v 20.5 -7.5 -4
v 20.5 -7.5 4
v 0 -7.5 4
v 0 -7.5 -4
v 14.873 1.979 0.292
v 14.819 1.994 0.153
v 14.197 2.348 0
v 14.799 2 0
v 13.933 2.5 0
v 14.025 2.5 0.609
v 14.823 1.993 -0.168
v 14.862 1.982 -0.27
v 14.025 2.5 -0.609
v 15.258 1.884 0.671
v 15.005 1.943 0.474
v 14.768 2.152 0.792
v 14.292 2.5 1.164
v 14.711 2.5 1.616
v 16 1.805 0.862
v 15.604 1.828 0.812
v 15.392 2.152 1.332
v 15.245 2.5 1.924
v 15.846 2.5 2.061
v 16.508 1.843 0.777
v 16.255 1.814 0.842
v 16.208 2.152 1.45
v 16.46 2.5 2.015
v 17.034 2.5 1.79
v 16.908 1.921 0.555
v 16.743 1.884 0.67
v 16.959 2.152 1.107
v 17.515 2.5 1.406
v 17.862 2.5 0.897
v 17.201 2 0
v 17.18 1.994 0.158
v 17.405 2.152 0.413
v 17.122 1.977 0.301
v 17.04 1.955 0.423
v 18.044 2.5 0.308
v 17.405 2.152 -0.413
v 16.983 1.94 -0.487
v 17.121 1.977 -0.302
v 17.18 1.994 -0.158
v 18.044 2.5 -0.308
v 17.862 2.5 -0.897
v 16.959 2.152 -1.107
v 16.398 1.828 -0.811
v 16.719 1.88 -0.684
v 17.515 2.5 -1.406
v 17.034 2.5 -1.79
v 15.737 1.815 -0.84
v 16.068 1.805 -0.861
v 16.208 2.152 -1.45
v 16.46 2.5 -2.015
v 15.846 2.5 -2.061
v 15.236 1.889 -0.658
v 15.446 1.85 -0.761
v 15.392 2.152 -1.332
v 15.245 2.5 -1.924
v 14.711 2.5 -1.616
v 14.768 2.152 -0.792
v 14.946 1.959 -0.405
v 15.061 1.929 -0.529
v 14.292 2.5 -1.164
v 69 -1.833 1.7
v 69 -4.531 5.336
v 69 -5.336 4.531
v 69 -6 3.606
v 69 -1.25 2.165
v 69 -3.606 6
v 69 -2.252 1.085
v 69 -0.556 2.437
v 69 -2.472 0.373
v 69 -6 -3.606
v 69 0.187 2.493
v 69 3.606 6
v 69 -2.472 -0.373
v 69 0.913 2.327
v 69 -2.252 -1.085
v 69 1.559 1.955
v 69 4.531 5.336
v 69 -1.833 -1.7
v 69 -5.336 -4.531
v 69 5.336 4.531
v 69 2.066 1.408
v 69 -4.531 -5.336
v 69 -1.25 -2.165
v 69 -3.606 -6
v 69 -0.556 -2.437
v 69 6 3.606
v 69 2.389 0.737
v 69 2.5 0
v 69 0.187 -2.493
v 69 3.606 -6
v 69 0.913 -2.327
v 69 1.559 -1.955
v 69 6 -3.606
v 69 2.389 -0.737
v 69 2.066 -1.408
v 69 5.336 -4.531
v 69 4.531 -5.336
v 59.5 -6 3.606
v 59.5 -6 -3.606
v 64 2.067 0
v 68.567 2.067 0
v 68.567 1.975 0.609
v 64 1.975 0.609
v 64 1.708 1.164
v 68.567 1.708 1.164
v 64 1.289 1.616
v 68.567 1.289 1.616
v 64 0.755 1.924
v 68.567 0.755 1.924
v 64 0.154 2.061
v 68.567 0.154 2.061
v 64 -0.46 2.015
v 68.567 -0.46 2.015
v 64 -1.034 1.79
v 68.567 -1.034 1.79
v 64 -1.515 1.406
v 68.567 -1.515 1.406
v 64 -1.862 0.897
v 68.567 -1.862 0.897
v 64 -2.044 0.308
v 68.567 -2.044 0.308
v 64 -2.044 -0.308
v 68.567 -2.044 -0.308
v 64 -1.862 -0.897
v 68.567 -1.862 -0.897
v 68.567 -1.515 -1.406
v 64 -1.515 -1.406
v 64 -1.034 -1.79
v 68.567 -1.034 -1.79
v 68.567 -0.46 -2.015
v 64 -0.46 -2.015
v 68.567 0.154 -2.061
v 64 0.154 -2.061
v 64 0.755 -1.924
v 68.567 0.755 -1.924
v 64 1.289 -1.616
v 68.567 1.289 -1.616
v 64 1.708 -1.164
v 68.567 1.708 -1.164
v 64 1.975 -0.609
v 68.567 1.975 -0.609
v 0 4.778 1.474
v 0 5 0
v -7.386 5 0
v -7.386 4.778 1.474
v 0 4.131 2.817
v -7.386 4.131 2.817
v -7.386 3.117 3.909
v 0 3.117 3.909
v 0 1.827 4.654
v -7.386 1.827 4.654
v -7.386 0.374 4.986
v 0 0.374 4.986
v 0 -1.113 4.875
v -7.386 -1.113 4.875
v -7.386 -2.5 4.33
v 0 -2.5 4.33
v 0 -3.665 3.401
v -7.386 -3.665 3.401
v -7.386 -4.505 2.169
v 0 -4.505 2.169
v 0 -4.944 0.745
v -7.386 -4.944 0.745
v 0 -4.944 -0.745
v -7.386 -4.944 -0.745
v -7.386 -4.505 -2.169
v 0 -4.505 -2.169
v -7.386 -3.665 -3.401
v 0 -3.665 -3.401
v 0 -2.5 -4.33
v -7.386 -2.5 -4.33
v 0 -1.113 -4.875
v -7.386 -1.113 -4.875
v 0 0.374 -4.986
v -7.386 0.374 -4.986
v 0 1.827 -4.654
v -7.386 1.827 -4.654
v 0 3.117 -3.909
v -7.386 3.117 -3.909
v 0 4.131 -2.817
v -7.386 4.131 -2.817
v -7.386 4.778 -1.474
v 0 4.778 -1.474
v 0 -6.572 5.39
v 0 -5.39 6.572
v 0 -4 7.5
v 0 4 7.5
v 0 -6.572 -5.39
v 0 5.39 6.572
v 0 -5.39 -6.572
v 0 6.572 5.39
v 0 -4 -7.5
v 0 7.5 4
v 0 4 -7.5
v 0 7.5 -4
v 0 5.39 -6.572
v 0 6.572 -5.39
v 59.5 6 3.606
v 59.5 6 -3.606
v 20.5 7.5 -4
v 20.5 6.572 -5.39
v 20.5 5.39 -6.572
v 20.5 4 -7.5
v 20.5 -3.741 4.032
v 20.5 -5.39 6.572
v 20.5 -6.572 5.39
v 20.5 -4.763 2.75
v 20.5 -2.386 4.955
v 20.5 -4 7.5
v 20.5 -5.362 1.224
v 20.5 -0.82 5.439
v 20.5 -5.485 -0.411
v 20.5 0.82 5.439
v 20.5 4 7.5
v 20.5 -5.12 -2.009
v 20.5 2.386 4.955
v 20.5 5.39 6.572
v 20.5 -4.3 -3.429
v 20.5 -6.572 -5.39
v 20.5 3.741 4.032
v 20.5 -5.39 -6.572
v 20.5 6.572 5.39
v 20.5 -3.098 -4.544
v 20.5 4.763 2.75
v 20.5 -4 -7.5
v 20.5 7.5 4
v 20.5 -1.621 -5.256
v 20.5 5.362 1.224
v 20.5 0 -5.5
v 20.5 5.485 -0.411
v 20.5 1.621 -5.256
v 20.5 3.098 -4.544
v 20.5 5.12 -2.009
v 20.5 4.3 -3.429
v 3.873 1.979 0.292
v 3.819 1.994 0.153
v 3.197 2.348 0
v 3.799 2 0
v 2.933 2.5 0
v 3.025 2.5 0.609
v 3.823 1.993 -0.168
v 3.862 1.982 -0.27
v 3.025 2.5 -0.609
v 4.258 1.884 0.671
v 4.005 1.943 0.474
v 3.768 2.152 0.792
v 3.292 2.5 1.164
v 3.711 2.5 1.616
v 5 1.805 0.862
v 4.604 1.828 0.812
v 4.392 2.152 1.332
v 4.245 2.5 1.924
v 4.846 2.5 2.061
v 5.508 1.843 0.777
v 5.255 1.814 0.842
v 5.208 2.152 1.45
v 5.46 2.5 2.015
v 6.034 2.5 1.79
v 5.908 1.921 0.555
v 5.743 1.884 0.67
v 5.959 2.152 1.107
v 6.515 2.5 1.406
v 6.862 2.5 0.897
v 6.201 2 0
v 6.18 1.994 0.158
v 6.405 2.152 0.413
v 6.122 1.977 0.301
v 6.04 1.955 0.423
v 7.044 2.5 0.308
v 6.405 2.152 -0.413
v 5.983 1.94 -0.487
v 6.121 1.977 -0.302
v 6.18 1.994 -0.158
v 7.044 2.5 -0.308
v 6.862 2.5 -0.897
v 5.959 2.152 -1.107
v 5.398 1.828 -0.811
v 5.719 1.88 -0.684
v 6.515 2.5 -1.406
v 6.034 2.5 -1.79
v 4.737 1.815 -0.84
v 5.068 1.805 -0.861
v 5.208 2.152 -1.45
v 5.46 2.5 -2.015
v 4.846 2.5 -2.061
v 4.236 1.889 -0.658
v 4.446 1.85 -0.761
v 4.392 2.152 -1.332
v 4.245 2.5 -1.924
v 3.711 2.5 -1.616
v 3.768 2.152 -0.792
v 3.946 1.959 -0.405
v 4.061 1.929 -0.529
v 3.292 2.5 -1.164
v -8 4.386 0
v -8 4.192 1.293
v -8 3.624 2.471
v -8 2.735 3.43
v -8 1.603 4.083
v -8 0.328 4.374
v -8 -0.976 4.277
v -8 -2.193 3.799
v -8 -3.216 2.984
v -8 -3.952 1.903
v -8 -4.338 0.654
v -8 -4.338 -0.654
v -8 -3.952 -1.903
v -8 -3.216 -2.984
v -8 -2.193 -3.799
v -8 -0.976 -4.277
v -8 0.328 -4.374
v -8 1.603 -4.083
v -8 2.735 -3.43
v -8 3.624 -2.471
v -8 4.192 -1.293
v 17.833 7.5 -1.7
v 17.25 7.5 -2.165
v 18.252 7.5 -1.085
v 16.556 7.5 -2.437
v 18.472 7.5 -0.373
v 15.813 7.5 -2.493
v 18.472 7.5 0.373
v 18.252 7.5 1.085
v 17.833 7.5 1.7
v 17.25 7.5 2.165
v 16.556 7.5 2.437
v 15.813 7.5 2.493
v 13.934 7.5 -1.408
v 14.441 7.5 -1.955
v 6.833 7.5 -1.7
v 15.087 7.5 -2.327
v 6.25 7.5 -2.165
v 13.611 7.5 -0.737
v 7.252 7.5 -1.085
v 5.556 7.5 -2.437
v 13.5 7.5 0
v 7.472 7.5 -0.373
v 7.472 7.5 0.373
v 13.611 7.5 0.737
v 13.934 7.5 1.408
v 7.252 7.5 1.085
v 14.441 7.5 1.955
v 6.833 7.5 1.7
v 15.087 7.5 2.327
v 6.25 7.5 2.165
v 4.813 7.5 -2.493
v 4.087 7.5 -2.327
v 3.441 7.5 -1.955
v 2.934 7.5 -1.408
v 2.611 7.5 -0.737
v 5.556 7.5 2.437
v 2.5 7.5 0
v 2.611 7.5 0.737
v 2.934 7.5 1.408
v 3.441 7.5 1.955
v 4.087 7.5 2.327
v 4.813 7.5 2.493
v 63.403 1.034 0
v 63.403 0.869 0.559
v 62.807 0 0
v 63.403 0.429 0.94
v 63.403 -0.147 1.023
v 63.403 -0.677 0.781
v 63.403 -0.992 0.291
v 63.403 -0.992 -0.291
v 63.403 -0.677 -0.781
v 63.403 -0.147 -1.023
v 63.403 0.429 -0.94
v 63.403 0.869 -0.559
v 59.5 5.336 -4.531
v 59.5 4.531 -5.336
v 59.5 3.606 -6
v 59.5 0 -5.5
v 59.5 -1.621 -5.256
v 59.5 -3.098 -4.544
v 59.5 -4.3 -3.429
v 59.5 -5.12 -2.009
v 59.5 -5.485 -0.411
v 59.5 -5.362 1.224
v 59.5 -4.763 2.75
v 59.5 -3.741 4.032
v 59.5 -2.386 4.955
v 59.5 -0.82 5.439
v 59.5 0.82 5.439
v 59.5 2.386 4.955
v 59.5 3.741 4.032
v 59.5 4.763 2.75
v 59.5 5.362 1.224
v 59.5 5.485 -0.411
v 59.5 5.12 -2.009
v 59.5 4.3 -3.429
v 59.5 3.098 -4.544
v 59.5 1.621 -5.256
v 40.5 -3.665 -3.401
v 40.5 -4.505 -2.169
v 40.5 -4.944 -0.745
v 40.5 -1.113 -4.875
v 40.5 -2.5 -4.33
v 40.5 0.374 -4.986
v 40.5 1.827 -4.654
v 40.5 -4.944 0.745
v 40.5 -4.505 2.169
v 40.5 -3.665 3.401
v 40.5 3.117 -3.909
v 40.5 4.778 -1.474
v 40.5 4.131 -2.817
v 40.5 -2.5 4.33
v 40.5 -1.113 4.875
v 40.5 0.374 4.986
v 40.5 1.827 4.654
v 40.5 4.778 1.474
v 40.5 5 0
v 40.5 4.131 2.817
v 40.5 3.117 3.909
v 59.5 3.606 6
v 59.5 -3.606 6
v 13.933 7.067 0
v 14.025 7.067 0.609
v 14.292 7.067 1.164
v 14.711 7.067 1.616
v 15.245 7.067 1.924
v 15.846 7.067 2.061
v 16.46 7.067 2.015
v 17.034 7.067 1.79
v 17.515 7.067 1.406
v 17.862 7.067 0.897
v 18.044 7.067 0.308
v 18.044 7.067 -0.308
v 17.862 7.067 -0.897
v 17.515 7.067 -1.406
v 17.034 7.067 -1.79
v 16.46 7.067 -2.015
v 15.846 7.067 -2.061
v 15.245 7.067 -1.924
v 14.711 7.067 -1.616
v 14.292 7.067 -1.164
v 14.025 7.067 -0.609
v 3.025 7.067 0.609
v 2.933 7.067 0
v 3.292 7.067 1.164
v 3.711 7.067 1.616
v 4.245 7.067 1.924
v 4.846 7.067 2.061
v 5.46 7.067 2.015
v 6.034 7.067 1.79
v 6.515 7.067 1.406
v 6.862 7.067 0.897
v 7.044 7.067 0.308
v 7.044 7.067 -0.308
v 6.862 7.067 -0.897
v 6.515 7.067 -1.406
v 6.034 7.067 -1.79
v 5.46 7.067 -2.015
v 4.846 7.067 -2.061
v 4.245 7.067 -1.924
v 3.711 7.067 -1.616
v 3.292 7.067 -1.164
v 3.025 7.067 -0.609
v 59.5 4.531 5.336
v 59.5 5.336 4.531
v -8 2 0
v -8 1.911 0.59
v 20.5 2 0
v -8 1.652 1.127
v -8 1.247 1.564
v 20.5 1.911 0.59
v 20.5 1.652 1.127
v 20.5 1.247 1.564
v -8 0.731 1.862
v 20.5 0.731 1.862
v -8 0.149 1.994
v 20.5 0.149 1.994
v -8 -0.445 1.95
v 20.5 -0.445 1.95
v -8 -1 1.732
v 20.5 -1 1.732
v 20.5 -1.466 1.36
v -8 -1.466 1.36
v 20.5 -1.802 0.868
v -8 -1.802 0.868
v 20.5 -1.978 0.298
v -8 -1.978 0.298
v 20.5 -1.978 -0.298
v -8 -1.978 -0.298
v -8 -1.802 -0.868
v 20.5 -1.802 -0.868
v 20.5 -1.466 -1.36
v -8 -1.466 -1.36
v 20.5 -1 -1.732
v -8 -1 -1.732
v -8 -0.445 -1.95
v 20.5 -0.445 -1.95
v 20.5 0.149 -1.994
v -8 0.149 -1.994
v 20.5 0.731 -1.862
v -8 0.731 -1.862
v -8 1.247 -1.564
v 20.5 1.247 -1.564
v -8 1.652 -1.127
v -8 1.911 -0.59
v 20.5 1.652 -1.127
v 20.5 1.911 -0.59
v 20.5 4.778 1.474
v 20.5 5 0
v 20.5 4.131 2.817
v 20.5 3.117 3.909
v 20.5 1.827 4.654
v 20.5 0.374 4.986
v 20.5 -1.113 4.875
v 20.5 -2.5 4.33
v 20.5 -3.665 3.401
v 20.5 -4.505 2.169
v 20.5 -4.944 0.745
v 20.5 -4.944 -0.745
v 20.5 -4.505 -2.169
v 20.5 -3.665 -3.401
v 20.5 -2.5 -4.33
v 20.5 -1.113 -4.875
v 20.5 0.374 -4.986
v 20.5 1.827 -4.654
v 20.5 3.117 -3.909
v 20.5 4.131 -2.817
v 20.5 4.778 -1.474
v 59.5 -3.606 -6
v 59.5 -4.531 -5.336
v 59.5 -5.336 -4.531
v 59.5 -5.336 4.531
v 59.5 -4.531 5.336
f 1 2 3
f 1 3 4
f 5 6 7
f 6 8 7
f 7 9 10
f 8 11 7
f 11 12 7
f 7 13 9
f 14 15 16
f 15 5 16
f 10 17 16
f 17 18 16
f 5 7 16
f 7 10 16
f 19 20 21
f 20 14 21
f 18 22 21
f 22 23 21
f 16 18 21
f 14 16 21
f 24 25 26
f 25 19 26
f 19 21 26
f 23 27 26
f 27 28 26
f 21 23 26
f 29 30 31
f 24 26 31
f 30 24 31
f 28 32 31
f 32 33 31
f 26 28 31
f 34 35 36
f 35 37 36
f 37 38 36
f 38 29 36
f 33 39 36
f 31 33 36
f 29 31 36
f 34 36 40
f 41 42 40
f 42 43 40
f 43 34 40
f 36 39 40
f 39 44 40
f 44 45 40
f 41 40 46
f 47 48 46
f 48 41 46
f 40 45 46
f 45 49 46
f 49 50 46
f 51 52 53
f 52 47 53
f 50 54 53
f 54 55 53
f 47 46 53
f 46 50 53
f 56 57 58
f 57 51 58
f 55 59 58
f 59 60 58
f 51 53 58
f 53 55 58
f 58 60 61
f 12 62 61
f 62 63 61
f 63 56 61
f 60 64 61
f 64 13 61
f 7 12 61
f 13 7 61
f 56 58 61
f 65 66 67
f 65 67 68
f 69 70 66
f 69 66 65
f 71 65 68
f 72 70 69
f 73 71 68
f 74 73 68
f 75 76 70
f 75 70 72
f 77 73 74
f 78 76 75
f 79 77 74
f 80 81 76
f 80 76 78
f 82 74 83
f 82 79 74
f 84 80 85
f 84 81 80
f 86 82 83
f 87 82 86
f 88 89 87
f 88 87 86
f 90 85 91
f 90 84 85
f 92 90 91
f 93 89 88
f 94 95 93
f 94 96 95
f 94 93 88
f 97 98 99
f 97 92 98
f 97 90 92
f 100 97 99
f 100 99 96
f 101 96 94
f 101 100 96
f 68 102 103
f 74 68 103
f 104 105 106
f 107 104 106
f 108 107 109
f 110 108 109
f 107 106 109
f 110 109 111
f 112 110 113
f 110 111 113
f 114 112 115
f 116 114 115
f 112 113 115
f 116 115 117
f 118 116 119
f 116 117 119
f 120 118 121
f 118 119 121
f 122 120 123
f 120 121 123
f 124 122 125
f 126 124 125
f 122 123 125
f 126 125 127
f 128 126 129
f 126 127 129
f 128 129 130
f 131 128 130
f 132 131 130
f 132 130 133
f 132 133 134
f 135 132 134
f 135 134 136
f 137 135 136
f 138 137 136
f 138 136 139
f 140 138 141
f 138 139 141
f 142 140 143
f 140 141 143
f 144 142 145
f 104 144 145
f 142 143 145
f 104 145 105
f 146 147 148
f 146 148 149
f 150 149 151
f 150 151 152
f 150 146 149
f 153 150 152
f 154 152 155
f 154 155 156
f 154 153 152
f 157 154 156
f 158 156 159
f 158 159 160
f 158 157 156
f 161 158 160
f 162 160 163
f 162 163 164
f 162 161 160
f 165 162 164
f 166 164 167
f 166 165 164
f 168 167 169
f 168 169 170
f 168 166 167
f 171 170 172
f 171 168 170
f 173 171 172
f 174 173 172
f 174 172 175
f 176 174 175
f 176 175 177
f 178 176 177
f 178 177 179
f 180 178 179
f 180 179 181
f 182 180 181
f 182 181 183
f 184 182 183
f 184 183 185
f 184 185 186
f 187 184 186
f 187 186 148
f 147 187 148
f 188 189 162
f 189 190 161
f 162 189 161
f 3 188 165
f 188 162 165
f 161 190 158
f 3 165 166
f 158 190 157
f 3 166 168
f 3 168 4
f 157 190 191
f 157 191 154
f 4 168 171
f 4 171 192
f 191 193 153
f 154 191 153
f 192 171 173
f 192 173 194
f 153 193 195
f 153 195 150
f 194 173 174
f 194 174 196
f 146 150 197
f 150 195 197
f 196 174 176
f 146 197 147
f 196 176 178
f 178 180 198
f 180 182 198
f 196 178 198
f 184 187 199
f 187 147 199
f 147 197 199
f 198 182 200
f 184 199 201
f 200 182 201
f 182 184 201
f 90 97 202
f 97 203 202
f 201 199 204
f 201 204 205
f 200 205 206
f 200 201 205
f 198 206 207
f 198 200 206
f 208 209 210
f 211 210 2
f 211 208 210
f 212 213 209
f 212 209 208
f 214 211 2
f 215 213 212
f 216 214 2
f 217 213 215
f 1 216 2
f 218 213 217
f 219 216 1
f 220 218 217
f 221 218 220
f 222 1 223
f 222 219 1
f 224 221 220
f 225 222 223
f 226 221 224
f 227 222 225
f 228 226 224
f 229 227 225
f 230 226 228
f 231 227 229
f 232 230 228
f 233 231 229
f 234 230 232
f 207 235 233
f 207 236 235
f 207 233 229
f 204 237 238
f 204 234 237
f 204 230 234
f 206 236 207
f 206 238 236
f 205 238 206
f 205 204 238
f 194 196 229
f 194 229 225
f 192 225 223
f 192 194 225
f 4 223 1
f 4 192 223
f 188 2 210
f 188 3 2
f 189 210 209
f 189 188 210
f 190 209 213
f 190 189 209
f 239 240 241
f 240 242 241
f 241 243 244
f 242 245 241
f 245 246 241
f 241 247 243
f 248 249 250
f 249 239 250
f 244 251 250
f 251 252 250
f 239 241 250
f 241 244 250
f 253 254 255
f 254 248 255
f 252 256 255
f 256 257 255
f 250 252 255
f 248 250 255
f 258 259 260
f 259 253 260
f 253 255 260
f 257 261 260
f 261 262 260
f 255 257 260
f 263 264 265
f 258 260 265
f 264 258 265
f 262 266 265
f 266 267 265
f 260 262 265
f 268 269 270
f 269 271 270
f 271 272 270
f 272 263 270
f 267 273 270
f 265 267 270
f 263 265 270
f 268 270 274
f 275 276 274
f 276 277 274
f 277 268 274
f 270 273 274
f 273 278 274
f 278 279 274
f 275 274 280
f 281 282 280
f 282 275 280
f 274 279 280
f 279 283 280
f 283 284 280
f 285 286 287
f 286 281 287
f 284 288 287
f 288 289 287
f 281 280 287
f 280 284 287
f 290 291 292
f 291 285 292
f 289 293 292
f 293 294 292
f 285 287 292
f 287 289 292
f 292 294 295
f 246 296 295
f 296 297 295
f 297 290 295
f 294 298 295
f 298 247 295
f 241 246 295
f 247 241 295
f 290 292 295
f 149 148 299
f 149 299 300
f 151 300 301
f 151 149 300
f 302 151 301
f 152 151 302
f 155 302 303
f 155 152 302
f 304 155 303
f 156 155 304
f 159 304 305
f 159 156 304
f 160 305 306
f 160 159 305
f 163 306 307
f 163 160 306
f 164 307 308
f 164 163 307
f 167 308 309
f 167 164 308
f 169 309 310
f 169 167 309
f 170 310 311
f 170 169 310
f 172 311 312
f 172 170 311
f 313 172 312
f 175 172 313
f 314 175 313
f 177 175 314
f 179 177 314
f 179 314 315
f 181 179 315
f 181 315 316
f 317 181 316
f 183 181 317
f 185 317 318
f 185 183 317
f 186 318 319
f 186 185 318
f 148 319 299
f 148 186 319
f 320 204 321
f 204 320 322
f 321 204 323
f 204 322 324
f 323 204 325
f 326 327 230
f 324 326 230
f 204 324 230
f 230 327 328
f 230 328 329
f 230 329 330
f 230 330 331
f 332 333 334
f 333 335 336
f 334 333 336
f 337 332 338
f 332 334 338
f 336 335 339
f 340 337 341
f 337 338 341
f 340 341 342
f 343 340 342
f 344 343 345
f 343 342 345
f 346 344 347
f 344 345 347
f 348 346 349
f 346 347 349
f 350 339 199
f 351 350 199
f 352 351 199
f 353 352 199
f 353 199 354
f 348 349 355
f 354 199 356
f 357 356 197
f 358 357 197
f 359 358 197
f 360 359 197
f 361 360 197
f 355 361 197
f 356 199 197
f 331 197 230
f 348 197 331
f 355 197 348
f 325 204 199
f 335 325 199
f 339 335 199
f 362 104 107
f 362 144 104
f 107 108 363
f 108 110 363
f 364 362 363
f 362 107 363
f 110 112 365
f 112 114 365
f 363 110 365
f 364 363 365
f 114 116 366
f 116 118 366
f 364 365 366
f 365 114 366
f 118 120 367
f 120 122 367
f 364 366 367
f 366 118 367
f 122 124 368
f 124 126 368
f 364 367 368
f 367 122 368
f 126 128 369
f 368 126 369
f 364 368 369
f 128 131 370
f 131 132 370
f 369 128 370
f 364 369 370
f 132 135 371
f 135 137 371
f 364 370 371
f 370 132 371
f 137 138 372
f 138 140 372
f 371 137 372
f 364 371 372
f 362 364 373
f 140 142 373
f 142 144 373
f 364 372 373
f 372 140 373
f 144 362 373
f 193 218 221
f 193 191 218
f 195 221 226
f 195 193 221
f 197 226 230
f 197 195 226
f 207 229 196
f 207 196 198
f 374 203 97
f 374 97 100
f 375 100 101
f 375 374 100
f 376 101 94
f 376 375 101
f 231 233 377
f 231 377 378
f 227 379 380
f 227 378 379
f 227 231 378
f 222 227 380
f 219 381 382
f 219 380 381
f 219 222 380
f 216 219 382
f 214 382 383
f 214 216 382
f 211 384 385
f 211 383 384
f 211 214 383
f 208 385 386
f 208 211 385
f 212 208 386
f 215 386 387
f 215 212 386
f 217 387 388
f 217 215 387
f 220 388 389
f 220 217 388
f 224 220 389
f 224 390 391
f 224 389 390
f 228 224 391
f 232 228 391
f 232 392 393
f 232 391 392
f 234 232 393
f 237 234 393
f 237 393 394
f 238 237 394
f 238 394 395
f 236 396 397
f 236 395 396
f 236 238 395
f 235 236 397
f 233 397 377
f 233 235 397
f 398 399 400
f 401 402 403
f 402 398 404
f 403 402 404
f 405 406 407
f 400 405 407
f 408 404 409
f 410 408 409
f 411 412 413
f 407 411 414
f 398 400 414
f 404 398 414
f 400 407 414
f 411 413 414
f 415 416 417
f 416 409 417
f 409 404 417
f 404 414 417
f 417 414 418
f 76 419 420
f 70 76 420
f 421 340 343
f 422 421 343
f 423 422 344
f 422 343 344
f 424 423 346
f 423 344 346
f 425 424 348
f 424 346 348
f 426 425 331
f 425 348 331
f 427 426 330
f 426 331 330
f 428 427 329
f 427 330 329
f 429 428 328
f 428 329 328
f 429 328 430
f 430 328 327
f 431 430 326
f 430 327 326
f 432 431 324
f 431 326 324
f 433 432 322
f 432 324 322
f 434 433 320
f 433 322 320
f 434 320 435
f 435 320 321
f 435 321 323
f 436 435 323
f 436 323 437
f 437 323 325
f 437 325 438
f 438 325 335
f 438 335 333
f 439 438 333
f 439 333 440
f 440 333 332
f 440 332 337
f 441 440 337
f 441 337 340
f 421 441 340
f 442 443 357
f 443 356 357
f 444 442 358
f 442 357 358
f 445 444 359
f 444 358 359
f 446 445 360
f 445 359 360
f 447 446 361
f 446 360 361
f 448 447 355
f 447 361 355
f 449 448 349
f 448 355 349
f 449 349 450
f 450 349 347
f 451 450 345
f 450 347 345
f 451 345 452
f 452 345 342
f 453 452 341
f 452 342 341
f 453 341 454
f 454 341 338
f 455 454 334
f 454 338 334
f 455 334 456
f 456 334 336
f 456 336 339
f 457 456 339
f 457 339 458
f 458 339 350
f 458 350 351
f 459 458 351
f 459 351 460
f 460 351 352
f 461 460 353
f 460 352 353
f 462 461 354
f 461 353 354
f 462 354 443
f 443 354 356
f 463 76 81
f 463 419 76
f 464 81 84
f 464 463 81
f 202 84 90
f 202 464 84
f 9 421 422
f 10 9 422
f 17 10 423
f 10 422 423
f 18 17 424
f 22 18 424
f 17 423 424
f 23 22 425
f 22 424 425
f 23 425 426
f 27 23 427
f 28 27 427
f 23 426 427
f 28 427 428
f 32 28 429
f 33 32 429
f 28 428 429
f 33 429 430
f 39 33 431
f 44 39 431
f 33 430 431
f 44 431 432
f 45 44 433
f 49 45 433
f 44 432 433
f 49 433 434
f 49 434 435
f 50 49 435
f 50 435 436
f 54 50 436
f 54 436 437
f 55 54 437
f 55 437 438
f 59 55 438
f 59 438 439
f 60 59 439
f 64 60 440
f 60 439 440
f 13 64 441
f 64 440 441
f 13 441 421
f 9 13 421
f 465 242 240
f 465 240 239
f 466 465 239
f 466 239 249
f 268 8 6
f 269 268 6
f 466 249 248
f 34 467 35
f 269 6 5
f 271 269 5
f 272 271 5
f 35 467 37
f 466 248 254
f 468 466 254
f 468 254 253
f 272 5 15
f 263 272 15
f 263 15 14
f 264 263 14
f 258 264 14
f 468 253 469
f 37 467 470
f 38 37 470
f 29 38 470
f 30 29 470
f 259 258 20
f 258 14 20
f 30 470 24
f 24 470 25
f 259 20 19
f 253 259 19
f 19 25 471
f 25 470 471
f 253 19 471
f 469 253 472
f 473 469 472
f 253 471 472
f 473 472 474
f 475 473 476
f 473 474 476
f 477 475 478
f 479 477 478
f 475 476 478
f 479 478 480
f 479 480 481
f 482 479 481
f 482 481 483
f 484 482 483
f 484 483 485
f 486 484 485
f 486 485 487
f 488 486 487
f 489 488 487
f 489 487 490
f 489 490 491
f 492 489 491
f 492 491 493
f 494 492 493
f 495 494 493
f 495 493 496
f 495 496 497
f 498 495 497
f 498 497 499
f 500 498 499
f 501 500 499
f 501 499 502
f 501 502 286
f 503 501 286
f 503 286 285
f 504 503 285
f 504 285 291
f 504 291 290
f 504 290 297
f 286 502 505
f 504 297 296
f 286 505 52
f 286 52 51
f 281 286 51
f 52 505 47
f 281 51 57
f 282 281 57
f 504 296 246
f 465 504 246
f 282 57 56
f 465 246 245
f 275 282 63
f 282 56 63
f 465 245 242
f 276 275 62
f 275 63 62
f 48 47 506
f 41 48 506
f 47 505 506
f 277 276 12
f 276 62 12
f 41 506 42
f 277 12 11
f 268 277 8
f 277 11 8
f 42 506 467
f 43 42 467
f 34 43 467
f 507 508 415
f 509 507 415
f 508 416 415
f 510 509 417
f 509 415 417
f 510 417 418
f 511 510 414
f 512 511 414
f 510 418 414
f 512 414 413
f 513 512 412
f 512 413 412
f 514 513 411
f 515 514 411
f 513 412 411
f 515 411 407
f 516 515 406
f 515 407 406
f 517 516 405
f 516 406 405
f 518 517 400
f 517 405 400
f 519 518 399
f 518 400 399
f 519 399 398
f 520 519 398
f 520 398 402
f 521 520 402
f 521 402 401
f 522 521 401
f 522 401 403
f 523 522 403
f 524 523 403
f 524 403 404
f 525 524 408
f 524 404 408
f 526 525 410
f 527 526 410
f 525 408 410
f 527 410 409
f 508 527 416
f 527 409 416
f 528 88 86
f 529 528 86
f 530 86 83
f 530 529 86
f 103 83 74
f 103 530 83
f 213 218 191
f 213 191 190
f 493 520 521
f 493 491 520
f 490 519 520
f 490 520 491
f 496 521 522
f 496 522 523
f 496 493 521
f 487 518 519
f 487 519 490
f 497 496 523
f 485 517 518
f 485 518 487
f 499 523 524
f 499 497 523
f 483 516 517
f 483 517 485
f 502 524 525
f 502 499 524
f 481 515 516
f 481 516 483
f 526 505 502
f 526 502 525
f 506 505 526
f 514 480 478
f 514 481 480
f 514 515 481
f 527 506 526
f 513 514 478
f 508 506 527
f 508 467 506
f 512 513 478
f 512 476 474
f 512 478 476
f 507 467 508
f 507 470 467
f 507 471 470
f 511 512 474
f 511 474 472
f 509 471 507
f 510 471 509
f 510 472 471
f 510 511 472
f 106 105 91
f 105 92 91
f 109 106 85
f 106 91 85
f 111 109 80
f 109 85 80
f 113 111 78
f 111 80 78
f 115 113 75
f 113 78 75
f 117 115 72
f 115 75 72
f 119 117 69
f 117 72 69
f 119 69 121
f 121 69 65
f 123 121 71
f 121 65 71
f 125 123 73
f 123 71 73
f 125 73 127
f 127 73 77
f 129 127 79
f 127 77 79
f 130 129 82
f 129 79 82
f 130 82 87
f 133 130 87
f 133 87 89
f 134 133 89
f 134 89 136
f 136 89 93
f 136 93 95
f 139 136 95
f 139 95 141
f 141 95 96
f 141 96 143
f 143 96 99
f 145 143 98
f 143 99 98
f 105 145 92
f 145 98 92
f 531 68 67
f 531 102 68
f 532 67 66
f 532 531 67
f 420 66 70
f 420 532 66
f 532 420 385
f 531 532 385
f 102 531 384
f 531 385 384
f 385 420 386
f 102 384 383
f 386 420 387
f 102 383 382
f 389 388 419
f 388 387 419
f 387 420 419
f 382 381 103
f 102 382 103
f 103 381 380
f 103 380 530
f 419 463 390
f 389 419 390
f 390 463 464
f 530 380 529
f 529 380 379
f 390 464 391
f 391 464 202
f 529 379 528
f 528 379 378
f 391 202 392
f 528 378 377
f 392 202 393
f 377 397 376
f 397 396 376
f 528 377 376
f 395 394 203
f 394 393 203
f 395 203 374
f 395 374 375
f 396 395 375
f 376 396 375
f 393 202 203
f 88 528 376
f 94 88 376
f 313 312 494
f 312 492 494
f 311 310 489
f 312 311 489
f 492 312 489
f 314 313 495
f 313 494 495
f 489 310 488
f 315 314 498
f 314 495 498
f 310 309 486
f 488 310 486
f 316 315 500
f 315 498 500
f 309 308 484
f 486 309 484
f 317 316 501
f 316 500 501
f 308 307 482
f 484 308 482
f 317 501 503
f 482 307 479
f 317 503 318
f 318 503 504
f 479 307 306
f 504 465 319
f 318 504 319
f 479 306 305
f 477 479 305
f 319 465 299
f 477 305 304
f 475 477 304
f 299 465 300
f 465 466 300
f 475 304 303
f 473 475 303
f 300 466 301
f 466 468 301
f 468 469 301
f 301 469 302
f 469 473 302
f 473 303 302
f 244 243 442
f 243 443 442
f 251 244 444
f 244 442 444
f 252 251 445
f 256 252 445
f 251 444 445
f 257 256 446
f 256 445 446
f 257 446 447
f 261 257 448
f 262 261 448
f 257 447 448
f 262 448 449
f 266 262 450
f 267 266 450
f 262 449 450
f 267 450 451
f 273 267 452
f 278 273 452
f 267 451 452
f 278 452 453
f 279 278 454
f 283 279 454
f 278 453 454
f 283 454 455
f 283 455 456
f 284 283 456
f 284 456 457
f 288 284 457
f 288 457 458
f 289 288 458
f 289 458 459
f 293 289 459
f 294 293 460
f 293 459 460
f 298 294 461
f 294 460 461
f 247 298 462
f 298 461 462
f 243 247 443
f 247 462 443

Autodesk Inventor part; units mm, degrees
sketch "Sketch_8" plane through (0, 0, 0) normal (0, 0, 1) x (1, 0, 0)
  line L0 (0, 0) -> (-8, 0)
  line L1 (-8, 0) -> (-8, 4.3865)
  line L2 (-8, 4.3865) -> (-7.3865, 5)
  line L3 (-7.3865, 5) -> (0, 5)
  line L4 (0, 5) -> (0, 0)
  line L5 (0, 0) -> (-8, 0)
revolve "Revolution1" add sketch "Sketch_8" angle 360 about axis through (0, 0, 0) along (1, 0, 0)
thread "Thread1" size "M10x1" class "6g" standard "ISO Metric profile" length 5.8865
sketch "Sketch_9" plane through (0, 0, 0) normal (1, 0, 0) x (0, 0, -1)
  line L0 (-7.5, 4) -> (-7.5, -4)
  arc A0 (-7.5, -4) -> (-4, -7.5) centre (0, 0) ccw
  line L1 (-4, -7.5) -> (4, -7.5)
  arc A1 (4, -7.5) -> (7.5, -4) centre (0, 0) ccw
  line L2 (7.5, -4) -> (7.5, 4)
  arc A2 (7.5, 4) -> (4, 7.5) centre (0, 0) ccw
  line L3 (4, 7.5) -> (-4, 7.5)
  arc A3 (-4, 7.5) -> (-7.5, 4) centre (0, 0) ccw
extrude "Extrusion1" add sketch "Sketch_9" along normal blind 20.5
sketch "Sketch_6" plane through (20.5, 0, 0) normal (1, 0, 0) x (0, 0, -1)
  circle A0 centre (0, 0) radius 5.5
extrude "Extrusion2" add sketch "Sketch_6" along normal blind 39
sketch "Sketch_10" plane through (59.5, 0, 0) normal (1, 0, 0) x (0, 0, -1)
  line L0 (-6, 3.6056) -> (-6, -3.6056)
  arc A0 (-6, -3.6056) -> (-3.6056, -6) centre (0, 0) ccw
  line L1 (-3.6056, -6) -> (3.6056, -6)
  arc A1 (3.6056, -6) -> (6, -3.6056) centre (0, 0) ccw
  line L2 (6, -3.6056) -> (6, 3.6056)
  arc A2 (6, 3.6056) -> (3.6056, 6) centre (0, 0) ccw
  line L3 (3.6056, 6) -> (-3.6056, 6)
  arc A3 (-3.6056, 6) -> (-6, 3.6056) centre (0, 0) ccw
extrude "Extrusion3" add sketch "Sketch_10" along normal blind 9.5
sketch "Sketch7" plane through (0, 0, 0) normal (0, 0, 1) x (1, 0, 0)
  line L0 (5, 7.5) -> (5, 2.5)
  line L1 (5, 1.3066) -> (2.933, 2.5)
  line L2 (2.933, 2.5) -> (2.933, 7.067)
  line L3 (2.933, 7.067) -> (2.5, 7.5)
  line L4 (2.5, 7.5) -> (5, 7.5)
  line L5 (5, 7.5) -> (5, 1.3066)
revolve "Revolution2" cut sketch "Sketch7" angle 360 about axis through (5, 7.5, 0) along (0, 1, 0)
thread "Thread2" size "M5x0.8" class "6H" standard "ISO Metric profile" full length
sketch "Sketch_28" plane through (0, 0, 0) normal (0, 0, 1) x (1, 0, 0)
  line L0 (16, 7.5) -> (16, 2.5)
  line L1 (16, 1.3066) -> (13.933, 2.5)
  line L2 (13.933, 2.5) -> (13.933, 7.067)
  line L3 (13.933, 7.067) -> (13.5, 7.5)
  line L4 (13.5, 7.5) -> (16, 7.5)
  line L5 (16, 7.5) -> (16, 1.3066)
revolve "Revolution3" cut sketch "Sketch_28" angle 360 about axis through (16, 7.5, 0) along (0, 1, 0)
thread "Thread3" size "M5x0.8" class "6H" standard "ISO Metric profile" full length
sketch "Sketch8" plane through (0, 0, 0) normal (0, 0, 1) x (1, 0, 0)
  line L0 (69, 0) -> (64, 0)
  line L1 (62.8066, 0) -> (64, 2.067)
  line L2 (64, 2.067) -> (68.567, 2.067)
  line L3 (68.567, 2.067) -> (69, 2.5)
  line L4 (69, 2.5) -> (69, 0)
  line L5 (69, 0) -> (62.8066, 0)
revolve "Revolution4" cut sketch "Sketch8" angle 360 about axis through (69, 0, 0) along (1, 0, 0)
thread "Thread4" size "M5x0.8" class "6H" standard "ISO Metric profile" full length
sketch "Sketch_16" plane through (0, 0, 0) normal (0, 0, 1) x (1, 0, 0)
  line L0 (40.5, 0) -> (-8, 0)
  line L1 (-8, 0) -> (-8, 2)
  line L2 (-8, 2) -> (20.5, 2)
  line L3 (20.5, 2) -> (20.5, 5)
  line L4 (20.5, 5) -> (40.5, 5)
  line L5 (40.5, 5) -> (40.5, 0)
  line L6 (40.5, 0) -> (-8, 0)
revolve "Revolution5" cut sketch "Sketch_16" angle 360 about axis through (40.5, 0, 0) along (1, 0, 0)
ref_plane "BODY_N_XY" through (77, 0, 0) normal (0, 0, -1) x (1, 0, 0)
ref_plane "BODY_N_YZ" through (77, 0, 0) normal (1, 0, 0) x (0, -1, 0)
ref_plane "BODY_N_ZX" through (77, 0, 0) normal (0, -1, 0) x (0, 0, -1)
ref_plane "NUT2_XY" through (69, 0, 0) normal (1, 0, 0) x (0, 0, -1)
ref_plane "NUT2_YZ" through (69, 0, 0) normal (0, 0, -1) x (0, 1, 0)
ref_plane "NUT2_ZX" through (69, 0, 0) normal (0, 1, 0) x (1, 0, 0)
ref_plane "SW1_XY" through (25, 0, 0) normal (1, 0, 0) x (0, 0, -1)
ref_plane "SW1_YZ" through (25, 0, 0) normal (0, 0, -1) x (0, 1, 0)
ref_plane "SW1_ZX" through (25, 0, 0) normal (0, 1, 0) x (1, 0, 0)
ref_plane "SW2_XY" through (55, 0, 0) normal (-1, 0, 0) x (0, 0, -1)
ref_plane "SW2_YZ" through (55, 0, 0) normal (0, 0, -1) x (0, -1, 0)
ref_plane "SW2_ZX" through (55, 0, 0) normal (0, -1, 0) x (-1, 0, 0)
ref_plane "SW_R1_XY" through (25, -12.5, 0) normal (1, 0, 0) x (0, 0, -1)
ref_plane "SW_R1_YZ" through (25, -12.5, 0) normal (0, 0, -1) x (0, 1, 0)
ref_plane "SW_R1_ZX" through (25, -12.5, 0) normal (0, 1, 0) x (1, 0, 0)
ref_plane "SW_R2_XY" through (55, -12.5, 0) normal (-1, 0, 0) x (0, 0, -1)
ref_plane "SW_R2_YZ" through (55, -12.5, 0) normal (0, 0, -1) x (0, -1, 0)
ref_plane "SW_R2_ZX" through (55, -12.5, 0) normal (0, -1, 0) x (-1, 0, 0)
ref_plane "body_XY" through (0, 0, 0) normal (1, 0, 0) x (0, 0, -1)
ref_plane "body_YZ" through (0, 0, 0) normal (0, 0, -1) x (0, 1, 0)
ref_plane "body_ZX" through (0, 0, 0) normal (0, 1, 0) x (1, 0, 0)
properties part number "10-CJ2B10-15RZ(1_0)_BODY"
